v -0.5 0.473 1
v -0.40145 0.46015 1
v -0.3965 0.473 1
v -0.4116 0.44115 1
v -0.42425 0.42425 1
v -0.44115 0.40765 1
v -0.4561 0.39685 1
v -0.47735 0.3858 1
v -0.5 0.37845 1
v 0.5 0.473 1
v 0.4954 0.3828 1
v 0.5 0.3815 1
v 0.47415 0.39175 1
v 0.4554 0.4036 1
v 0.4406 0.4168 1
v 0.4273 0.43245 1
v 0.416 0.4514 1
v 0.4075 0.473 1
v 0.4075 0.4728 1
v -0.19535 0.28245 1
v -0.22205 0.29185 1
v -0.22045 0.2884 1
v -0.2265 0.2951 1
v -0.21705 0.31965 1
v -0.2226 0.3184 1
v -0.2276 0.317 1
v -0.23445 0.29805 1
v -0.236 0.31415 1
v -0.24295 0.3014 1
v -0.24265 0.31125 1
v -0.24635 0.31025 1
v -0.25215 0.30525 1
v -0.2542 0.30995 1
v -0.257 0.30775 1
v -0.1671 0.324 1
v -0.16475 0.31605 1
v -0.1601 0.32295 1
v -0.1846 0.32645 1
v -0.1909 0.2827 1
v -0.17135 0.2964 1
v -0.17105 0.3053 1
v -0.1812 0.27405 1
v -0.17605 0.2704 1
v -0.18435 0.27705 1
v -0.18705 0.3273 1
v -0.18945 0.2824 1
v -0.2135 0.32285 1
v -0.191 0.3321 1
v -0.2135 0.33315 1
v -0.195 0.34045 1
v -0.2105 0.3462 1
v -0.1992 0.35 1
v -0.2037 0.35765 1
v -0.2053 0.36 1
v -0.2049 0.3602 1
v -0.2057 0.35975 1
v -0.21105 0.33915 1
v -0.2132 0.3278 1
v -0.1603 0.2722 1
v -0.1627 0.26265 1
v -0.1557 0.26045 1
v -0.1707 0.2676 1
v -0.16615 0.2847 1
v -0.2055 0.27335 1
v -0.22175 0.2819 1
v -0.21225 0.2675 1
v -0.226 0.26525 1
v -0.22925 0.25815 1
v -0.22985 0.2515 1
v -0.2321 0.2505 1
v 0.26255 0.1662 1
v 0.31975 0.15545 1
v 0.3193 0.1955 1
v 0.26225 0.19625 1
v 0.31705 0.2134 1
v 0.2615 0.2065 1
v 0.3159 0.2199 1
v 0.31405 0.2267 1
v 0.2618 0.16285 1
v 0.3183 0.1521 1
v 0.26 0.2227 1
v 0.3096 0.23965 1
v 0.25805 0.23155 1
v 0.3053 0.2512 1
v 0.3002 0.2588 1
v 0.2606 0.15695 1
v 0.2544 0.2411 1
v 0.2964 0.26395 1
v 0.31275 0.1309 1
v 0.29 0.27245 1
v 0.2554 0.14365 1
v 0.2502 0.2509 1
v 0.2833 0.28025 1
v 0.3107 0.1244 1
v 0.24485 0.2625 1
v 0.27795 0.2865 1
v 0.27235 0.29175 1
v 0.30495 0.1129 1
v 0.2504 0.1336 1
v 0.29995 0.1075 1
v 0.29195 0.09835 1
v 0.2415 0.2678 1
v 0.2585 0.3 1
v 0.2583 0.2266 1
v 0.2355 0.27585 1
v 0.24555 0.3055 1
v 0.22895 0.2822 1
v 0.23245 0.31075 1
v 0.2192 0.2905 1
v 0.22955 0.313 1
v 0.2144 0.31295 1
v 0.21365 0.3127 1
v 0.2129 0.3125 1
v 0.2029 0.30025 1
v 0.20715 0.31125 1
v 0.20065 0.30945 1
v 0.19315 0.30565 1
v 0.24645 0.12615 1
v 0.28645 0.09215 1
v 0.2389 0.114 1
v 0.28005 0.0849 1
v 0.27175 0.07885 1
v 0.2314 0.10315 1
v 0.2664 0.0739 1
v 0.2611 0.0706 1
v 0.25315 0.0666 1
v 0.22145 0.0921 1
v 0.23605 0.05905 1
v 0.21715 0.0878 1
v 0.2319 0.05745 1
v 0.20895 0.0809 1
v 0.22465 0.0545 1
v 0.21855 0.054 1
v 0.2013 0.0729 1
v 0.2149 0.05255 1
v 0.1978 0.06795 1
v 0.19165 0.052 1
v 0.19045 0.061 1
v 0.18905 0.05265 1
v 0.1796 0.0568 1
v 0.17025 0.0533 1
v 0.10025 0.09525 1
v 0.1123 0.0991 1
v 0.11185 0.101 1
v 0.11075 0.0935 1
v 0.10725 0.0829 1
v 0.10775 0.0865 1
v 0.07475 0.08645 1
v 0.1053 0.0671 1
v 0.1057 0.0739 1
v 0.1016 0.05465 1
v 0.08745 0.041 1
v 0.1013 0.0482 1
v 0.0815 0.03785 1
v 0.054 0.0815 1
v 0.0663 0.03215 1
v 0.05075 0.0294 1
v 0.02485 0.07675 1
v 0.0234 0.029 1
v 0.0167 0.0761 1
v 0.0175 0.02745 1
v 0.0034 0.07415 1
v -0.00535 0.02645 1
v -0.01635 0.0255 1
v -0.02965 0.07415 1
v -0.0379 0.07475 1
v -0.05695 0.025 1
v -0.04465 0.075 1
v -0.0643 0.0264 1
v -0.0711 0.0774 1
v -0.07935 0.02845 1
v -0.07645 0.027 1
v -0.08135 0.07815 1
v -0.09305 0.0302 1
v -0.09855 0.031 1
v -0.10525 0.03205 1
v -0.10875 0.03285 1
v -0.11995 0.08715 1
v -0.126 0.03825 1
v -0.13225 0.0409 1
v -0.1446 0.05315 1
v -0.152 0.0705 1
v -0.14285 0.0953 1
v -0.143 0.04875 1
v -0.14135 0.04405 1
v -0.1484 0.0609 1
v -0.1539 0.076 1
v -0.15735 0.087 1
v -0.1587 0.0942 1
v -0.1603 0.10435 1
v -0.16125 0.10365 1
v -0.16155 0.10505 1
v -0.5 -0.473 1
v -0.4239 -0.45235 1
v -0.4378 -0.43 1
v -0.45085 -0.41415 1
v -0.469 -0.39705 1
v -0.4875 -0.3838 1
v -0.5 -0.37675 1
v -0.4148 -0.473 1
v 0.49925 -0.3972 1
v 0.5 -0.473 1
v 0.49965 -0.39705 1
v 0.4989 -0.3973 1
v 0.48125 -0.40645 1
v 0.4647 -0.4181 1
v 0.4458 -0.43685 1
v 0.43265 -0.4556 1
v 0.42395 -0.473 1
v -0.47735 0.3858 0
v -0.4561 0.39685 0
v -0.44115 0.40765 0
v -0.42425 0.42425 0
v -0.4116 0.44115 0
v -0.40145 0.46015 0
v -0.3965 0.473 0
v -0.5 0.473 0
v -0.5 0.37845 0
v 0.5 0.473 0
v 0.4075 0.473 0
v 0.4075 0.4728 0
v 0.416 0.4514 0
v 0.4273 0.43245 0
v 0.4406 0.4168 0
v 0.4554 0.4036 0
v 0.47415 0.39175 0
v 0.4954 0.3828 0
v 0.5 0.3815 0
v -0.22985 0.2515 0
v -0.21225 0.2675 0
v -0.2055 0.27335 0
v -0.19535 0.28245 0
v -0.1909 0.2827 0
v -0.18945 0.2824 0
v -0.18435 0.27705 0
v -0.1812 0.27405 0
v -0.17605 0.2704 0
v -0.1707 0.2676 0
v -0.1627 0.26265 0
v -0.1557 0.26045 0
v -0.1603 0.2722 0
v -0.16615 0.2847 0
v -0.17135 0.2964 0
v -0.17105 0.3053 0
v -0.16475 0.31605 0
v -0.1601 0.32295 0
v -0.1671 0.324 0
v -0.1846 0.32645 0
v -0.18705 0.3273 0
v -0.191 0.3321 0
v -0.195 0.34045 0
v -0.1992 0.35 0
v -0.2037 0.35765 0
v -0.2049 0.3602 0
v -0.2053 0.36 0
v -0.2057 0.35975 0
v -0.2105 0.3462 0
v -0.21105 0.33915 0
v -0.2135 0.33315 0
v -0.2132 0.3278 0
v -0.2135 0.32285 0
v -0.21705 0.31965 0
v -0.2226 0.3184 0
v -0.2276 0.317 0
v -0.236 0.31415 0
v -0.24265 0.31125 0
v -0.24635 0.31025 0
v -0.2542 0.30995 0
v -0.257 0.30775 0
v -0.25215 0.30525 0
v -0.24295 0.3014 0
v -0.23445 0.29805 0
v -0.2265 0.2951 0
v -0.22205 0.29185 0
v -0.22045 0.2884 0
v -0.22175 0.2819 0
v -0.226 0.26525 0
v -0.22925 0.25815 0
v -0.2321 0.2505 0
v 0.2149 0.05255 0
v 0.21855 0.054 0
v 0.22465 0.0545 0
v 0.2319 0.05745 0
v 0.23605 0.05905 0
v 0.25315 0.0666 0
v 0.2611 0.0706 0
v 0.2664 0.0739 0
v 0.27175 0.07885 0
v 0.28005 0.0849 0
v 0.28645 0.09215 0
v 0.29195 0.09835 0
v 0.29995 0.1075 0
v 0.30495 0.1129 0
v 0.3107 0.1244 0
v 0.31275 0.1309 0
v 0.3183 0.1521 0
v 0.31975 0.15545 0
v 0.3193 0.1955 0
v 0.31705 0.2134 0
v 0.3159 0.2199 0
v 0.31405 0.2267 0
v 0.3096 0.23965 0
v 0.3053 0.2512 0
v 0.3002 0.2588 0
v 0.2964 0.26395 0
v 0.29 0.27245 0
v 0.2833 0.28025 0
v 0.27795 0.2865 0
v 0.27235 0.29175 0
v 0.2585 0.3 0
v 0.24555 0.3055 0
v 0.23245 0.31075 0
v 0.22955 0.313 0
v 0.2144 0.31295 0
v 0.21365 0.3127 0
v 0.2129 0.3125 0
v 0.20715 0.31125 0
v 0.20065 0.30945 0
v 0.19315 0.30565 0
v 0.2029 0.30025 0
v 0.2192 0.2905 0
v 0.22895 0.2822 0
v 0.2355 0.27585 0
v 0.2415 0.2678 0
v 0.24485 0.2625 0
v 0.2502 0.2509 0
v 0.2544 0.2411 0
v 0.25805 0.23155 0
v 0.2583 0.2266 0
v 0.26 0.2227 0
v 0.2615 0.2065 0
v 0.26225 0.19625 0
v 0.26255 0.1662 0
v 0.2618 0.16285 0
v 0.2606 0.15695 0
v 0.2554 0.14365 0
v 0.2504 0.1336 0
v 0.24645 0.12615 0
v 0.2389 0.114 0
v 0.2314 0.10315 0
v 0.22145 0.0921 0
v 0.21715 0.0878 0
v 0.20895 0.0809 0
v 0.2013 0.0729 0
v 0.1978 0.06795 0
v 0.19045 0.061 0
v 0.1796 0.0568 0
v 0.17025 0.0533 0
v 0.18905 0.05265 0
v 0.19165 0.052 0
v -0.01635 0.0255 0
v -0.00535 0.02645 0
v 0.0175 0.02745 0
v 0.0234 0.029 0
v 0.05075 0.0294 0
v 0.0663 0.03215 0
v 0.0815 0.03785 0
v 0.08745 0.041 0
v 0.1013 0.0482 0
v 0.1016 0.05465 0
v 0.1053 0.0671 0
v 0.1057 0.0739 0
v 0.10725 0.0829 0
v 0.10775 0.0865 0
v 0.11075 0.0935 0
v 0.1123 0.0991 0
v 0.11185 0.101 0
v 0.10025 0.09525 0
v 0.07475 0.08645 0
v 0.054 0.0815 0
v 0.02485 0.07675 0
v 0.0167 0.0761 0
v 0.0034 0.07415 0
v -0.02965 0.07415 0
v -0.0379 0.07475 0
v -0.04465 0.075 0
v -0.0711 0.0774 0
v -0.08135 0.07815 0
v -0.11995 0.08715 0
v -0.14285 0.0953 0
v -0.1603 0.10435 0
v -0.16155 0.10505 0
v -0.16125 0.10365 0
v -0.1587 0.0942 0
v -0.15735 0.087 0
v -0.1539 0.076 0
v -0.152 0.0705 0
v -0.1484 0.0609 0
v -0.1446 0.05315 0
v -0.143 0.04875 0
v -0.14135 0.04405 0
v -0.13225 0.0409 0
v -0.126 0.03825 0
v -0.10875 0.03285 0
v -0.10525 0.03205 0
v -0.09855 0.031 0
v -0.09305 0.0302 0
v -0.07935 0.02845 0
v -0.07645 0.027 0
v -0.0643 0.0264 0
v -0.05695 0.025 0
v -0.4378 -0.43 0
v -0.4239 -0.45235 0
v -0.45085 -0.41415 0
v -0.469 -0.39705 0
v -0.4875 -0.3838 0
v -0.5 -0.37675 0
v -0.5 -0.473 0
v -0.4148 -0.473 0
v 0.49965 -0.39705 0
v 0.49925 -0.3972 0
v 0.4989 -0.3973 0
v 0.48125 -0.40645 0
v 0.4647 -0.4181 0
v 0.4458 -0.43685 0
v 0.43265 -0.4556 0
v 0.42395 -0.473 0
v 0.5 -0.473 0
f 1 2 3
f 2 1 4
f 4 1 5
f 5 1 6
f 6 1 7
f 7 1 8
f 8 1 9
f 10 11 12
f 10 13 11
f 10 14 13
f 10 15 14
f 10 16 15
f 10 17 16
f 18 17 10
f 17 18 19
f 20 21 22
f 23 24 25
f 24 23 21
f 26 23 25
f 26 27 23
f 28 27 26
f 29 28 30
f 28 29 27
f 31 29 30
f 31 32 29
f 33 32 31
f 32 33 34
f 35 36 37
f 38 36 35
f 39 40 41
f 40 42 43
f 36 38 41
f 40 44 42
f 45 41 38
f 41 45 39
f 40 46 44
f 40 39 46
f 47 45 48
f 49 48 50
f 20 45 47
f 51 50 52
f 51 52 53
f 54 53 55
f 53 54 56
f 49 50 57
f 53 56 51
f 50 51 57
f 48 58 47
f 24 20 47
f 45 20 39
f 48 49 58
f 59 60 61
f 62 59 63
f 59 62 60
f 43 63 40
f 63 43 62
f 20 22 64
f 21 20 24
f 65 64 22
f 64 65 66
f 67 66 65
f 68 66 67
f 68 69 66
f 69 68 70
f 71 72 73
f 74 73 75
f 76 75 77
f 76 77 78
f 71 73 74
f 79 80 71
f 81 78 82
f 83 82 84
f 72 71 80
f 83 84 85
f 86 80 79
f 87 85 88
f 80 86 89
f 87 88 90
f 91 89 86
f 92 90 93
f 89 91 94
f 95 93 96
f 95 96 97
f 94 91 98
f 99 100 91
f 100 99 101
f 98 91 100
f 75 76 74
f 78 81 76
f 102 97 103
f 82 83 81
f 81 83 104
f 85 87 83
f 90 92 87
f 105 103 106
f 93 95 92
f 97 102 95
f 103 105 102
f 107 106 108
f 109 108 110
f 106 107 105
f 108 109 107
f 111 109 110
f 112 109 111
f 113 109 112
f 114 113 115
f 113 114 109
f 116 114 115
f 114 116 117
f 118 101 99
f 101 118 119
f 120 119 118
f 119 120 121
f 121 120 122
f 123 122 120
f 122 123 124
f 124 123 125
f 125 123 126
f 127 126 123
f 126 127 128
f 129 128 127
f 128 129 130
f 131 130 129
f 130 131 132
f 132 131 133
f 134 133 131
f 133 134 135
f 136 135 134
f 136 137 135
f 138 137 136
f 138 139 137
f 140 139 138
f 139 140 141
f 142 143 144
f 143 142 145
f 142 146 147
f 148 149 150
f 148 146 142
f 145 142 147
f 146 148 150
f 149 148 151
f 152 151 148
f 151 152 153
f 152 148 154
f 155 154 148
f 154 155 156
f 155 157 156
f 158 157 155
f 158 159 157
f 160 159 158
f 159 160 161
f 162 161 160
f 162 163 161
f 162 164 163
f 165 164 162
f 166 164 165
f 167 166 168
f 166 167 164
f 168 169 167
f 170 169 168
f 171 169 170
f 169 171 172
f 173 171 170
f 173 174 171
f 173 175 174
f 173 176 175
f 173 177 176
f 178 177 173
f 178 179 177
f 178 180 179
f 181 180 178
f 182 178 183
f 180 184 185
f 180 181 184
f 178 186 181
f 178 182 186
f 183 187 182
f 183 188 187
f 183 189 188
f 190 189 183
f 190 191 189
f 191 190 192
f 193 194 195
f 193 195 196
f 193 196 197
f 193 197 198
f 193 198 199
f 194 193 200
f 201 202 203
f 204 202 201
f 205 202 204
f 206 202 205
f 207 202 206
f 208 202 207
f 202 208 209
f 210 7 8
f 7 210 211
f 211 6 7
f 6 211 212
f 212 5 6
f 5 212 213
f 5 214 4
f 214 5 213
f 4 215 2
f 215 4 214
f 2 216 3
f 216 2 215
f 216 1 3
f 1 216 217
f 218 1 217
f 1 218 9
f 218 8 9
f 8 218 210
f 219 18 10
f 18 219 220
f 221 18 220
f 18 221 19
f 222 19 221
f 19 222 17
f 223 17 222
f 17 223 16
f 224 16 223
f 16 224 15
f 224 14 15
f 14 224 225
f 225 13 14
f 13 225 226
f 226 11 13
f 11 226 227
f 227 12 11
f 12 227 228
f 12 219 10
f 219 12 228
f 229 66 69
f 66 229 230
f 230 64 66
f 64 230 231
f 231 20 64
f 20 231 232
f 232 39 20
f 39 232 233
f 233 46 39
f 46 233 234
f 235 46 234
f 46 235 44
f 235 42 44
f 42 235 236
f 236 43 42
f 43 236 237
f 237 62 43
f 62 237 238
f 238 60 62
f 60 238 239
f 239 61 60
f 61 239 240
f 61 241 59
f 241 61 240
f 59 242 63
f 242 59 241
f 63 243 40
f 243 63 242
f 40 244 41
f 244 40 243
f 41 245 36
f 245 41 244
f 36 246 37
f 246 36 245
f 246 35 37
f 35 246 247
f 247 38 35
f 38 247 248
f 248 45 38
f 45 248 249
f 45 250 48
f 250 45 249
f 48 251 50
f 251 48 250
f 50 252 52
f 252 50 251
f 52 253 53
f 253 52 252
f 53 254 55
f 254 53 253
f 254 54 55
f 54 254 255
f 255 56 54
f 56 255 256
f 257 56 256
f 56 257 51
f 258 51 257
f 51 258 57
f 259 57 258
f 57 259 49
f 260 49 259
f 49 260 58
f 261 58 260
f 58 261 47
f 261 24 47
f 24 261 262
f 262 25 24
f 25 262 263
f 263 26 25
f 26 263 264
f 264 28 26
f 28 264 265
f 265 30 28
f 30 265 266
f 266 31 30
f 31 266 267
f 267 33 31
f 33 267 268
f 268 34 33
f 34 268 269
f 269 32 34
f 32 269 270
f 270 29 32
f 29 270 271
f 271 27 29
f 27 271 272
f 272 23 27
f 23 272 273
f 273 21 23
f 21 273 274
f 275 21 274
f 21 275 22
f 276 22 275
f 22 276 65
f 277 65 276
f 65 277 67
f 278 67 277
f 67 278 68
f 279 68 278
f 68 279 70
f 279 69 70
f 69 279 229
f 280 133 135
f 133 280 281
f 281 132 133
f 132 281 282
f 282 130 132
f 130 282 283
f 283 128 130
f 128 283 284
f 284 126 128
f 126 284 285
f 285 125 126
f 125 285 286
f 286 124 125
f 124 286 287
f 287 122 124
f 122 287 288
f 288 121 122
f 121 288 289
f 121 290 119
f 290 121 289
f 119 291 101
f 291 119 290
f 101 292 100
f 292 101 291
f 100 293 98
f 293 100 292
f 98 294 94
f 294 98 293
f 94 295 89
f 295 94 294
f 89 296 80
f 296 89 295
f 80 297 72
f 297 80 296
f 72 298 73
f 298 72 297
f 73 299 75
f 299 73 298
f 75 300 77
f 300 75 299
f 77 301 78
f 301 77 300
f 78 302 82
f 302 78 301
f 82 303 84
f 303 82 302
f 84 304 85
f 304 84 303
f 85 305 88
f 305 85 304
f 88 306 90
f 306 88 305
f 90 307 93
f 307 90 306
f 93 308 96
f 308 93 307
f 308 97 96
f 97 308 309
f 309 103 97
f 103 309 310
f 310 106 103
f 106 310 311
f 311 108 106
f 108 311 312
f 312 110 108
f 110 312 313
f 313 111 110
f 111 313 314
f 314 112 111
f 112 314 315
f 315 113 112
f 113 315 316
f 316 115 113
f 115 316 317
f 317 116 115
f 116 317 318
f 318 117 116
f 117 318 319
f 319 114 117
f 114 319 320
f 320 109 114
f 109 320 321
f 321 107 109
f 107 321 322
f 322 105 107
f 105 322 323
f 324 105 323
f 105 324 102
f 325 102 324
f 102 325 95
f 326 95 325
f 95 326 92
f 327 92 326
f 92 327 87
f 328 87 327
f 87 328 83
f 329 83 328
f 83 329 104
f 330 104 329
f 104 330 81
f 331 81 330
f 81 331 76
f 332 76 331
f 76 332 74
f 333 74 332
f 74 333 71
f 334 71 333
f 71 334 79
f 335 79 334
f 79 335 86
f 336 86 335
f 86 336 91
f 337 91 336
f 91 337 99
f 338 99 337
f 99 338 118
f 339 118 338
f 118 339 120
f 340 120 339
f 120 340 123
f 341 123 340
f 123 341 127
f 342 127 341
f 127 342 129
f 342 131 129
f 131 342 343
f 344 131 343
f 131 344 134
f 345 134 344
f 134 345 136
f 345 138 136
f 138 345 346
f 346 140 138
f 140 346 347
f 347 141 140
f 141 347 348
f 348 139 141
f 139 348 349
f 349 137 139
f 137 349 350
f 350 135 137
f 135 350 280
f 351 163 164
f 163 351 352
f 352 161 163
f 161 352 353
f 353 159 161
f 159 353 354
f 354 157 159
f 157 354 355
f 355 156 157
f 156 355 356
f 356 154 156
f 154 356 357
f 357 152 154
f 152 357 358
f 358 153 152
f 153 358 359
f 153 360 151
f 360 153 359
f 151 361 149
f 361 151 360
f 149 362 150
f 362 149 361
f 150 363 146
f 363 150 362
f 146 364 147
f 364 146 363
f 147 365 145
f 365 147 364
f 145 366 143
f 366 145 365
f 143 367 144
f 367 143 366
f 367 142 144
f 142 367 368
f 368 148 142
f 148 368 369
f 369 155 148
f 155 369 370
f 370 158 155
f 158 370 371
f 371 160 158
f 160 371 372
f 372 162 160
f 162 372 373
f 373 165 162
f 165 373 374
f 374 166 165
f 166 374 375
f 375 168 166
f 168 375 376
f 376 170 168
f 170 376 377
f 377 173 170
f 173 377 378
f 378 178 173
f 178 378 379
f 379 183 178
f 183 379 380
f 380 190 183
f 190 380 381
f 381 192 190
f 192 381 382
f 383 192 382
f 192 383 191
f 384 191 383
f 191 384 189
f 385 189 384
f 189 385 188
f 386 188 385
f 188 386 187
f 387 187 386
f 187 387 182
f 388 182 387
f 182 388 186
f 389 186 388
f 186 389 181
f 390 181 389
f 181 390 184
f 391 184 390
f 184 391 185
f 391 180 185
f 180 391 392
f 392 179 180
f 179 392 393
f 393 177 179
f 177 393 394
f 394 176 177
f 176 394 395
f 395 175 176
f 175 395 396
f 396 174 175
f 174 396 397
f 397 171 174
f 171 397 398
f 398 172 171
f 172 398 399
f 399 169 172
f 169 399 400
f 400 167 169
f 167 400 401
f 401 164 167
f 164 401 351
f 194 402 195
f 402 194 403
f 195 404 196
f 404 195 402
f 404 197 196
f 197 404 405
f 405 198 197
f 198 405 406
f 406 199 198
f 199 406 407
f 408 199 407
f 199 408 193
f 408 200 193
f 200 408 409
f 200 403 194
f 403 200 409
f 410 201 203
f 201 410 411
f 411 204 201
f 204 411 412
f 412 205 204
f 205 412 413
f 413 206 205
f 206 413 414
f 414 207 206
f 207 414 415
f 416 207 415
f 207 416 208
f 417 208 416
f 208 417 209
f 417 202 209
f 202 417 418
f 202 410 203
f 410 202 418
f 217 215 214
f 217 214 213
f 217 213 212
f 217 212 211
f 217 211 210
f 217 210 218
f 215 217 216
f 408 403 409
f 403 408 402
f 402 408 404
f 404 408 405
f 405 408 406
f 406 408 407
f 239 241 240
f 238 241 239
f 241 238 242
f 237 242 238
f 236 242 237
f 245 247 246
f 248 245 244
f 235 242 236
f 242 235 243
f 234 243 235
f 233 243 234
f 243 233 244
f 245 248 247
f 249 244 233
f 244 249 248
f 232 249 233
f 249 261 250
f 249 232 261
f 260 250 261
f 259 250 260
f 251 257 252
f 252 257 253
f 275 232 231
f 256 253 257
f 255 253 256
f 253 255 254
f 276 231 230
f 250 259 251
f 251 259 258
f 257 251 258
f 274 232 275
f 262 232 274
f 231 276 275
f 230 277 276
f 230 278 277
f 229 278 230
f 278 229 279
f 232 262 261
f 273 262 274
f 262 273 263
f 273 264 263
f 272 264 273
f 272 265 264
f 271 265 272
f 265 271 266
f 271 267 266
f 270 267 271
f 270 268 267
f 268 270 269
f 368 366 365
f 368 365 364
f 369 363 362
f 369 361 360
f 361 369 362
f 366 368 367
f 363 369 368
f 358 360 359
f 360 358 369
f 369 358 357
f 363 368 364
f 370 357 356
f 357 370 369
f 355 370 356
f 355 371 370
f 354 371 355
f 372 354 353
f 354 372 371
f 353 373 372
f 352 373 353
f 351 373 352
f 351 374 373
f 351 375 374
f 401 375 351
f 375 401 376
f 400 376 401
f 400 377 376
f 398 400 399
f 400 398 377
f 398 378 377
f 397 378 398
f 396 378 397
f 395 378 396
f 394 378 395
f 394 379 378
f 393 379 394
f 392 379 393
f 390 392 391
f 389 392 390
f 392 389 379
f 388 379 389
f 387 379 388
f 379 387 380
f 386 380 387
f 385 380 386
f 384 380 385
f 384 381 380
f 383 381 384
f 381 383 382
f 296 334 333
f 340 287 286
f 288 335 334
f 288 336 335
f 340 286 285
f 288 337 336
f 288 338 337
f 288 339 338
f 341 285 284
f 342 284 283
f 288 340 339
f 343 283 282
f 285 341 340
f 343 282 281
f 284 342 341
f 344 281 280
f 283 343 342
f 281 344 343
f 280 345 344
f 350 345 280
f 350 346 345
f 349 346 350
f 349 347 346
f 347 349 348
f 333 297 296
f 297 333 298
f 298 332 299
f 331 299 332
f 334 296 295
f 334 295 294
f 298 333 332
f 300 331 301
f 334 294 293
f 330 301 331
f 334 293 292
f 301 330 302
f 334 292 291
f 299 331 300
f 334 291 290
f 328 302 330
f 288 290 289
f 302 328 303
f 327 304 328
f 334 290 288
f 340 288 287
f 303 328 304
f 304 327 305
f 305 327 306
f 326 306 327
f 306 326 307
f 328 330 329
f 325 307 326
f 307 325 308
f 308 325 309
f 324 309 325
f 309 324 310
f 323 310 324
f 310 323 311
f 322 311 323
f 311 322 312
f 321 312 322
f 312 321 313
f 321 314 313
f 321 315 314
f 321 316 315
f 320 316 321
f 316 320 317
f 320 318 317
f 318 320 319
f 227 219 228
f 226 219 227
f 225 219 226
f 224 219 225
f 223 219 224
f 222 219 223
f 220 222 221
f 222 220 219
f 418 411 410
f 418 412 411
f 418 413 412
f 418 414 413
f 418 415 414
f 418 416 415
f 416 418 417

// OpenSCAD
module StoutNewYellow_1()
{
 /* Generated by trace2scad version 20150415
    http://aggregate.org/MAKE/TRACE2SCAD/
    Optimized model has 213/1969 original points
 */
 color([0.5, 0.5, 0.5])
 assign(minx=0) /* polygon minx=0 */
 assign(miny=0) /* polygon miny=0 */
 assign(maxx=20000) /* polygon maxx=20000 */
 assign(maxy=18920) /* polygon maxy=18920 */
 assign(dx=maxx-minx)
 assign(dy=maxy-miny)
 assign(maxd=((dx>dy)?dx:dy))
 scale([1/maxd, 1/maxd, 1])
 translate([-minx-dx/2, -miny-dy/2, 0])
 linear_extrude(height=1, convexity=213)
 union() {
  union() {
   polygon([[0,17975],[0,17029],[453,17176],[878,17397],[1177,17613],[1515,17945],[1768,18283],[1971,18663],[2070,18920],[0,18920]], convexity=5);
   polygon([[18150,18918],[18150,18916],[18320,18488],[18546,18109],[18812,17796],[19108,17532],[19483,17295],[19908,17116],[20000,17090],[20000,18920],[18150,18920]], convexity=5);
   polygon([[5894,16660],[5886,16655],[5790,16384],[5779,16243],[5730,16123],[5736,16016],[5730,15917],[5659,15853],[5548,15828],[5448,15800],[5280,15743],[5147,15685],[5073,15665],[4916,15659],[4860,15615],[4957,15565],[5141,15488],[5311,15421],[5470,15362],[5559,15297],[5591,15228],[5565,15098],[5480,14765],[5415,14623],[5358,14470],[5403,14490],[5755,14810],[5890,14927],[6093,15109],[6182,15114],[6211,15108],[6313,15001],[6376,14941],[6479,14868],[6586,14812],[6746,14713],[6886,14669],[6794,14904],[6677,15154],[6573,15388],[6579,15566],[6705,15781],[6798,15919],[6658,15940],[6308,15989],[6259,16006],[6180,16102],[6100,16269],[6016,16460],[5926,16613],[5902,16664]], convexity=12);
   polygon([[14273,15714],[14258,15710],[14143,15685],[14013,15649],[13863,15573],[14058,15465],[14384,15270],[14579,15104],[14710,14977],[14830,14816],[14897,14710],[15004,14478],[15088,14282],[15161,14091],[15166,13992],[15200,13914],[15230,13590],[15245,13385],[15251,12784],[15236,12717],[15212,12599],[15108,12333],[15008,12132],[14929,11983],[14778,11740],[14628,11523],[14429,11302],[14343,11216],[14179,11078],[14026,10918],[13956,10819],[13809,10680],[13592,10596],[13405,10526],[13781,10513],[13833,10500],[14298,10511],[14371,10540],[14493,10550],[14638,10609],[14721,10641],[15063,10792],[15222,10872],[15328,10938],[15435,11037],[15601,11158],[15729,11303],[15839,11427],[15999,11610],[16099,11718],[16214,11948],[16255,12078],[16366,12502],[16395,12569],[16386,13370],[16341,13728],[16318,13858],[16281,13994],[16192,14253],[16106,14484],[16004,14636],[15928,14739],[15800,14909],[15666,15065],[15559,15190],[15447,15295],[15170,15460],[14911,15570],[14649,15675],[14591,15720],[14288,15719]], convexity=9);
   polygon([[6772,11547],[6775,11533],[6826,11344],[6853,11200],[6922,10980],[6960,10870],[7032,10678],[7108,10523],[7140,10435],[7173,10341],[7355,10278],[7480,10225],[7825,10117],[7895,10101],[8029,10080],[8139,10064],[8413,10029],[8471,10000],[8714,9988],[8861,9960],[9673,9970],[9893,9989],[10350,10009],[10468,10040],[11015,10048],[11326,10103],[11630,10217],[11749,10280],[12026,10424],[12032,10553],[12106,10802],[12114,10938],[12145,11118],[12155,11190],[12215,11330],[12246,11442],[12237,11480],[12005,11365],[11495,11189],[11080,11090],[10497,10995],[10334,10982],[10068,10943],[9407,10943],[9242,10955],[9107,10960],[8578,11008],[8373,11023],[7601,11203],[7143,11366],[6794,11547],[6769,11561]], convexity=7);
   polygon([[0,963],[0,0],[1704,0],[1522,413],[1244,860],[983,1177],[620,1519],[250,1784],[0,1925]], convexity=5);
   polygon([[19985,1516],[19978,1514],[19625,1331],[19294,1098],[18916,723],[18653,348],[18479,0],[20000,0],[19993,1519]], convexity=5);
  }
 }
}

module StoutNewYellow()
{
 /* all layers combined, scaled to within a 1mm cube */
 scale([1, 1, 1/1])
 difference() {
  union() {
   scale([1,1,2]) translate([0,0,-0.5]) StoutNewYellow_1();
  }
  translate([0,0,-2]) cube([2,2,4],center=true);
 }
}
StoutNewYellow();
